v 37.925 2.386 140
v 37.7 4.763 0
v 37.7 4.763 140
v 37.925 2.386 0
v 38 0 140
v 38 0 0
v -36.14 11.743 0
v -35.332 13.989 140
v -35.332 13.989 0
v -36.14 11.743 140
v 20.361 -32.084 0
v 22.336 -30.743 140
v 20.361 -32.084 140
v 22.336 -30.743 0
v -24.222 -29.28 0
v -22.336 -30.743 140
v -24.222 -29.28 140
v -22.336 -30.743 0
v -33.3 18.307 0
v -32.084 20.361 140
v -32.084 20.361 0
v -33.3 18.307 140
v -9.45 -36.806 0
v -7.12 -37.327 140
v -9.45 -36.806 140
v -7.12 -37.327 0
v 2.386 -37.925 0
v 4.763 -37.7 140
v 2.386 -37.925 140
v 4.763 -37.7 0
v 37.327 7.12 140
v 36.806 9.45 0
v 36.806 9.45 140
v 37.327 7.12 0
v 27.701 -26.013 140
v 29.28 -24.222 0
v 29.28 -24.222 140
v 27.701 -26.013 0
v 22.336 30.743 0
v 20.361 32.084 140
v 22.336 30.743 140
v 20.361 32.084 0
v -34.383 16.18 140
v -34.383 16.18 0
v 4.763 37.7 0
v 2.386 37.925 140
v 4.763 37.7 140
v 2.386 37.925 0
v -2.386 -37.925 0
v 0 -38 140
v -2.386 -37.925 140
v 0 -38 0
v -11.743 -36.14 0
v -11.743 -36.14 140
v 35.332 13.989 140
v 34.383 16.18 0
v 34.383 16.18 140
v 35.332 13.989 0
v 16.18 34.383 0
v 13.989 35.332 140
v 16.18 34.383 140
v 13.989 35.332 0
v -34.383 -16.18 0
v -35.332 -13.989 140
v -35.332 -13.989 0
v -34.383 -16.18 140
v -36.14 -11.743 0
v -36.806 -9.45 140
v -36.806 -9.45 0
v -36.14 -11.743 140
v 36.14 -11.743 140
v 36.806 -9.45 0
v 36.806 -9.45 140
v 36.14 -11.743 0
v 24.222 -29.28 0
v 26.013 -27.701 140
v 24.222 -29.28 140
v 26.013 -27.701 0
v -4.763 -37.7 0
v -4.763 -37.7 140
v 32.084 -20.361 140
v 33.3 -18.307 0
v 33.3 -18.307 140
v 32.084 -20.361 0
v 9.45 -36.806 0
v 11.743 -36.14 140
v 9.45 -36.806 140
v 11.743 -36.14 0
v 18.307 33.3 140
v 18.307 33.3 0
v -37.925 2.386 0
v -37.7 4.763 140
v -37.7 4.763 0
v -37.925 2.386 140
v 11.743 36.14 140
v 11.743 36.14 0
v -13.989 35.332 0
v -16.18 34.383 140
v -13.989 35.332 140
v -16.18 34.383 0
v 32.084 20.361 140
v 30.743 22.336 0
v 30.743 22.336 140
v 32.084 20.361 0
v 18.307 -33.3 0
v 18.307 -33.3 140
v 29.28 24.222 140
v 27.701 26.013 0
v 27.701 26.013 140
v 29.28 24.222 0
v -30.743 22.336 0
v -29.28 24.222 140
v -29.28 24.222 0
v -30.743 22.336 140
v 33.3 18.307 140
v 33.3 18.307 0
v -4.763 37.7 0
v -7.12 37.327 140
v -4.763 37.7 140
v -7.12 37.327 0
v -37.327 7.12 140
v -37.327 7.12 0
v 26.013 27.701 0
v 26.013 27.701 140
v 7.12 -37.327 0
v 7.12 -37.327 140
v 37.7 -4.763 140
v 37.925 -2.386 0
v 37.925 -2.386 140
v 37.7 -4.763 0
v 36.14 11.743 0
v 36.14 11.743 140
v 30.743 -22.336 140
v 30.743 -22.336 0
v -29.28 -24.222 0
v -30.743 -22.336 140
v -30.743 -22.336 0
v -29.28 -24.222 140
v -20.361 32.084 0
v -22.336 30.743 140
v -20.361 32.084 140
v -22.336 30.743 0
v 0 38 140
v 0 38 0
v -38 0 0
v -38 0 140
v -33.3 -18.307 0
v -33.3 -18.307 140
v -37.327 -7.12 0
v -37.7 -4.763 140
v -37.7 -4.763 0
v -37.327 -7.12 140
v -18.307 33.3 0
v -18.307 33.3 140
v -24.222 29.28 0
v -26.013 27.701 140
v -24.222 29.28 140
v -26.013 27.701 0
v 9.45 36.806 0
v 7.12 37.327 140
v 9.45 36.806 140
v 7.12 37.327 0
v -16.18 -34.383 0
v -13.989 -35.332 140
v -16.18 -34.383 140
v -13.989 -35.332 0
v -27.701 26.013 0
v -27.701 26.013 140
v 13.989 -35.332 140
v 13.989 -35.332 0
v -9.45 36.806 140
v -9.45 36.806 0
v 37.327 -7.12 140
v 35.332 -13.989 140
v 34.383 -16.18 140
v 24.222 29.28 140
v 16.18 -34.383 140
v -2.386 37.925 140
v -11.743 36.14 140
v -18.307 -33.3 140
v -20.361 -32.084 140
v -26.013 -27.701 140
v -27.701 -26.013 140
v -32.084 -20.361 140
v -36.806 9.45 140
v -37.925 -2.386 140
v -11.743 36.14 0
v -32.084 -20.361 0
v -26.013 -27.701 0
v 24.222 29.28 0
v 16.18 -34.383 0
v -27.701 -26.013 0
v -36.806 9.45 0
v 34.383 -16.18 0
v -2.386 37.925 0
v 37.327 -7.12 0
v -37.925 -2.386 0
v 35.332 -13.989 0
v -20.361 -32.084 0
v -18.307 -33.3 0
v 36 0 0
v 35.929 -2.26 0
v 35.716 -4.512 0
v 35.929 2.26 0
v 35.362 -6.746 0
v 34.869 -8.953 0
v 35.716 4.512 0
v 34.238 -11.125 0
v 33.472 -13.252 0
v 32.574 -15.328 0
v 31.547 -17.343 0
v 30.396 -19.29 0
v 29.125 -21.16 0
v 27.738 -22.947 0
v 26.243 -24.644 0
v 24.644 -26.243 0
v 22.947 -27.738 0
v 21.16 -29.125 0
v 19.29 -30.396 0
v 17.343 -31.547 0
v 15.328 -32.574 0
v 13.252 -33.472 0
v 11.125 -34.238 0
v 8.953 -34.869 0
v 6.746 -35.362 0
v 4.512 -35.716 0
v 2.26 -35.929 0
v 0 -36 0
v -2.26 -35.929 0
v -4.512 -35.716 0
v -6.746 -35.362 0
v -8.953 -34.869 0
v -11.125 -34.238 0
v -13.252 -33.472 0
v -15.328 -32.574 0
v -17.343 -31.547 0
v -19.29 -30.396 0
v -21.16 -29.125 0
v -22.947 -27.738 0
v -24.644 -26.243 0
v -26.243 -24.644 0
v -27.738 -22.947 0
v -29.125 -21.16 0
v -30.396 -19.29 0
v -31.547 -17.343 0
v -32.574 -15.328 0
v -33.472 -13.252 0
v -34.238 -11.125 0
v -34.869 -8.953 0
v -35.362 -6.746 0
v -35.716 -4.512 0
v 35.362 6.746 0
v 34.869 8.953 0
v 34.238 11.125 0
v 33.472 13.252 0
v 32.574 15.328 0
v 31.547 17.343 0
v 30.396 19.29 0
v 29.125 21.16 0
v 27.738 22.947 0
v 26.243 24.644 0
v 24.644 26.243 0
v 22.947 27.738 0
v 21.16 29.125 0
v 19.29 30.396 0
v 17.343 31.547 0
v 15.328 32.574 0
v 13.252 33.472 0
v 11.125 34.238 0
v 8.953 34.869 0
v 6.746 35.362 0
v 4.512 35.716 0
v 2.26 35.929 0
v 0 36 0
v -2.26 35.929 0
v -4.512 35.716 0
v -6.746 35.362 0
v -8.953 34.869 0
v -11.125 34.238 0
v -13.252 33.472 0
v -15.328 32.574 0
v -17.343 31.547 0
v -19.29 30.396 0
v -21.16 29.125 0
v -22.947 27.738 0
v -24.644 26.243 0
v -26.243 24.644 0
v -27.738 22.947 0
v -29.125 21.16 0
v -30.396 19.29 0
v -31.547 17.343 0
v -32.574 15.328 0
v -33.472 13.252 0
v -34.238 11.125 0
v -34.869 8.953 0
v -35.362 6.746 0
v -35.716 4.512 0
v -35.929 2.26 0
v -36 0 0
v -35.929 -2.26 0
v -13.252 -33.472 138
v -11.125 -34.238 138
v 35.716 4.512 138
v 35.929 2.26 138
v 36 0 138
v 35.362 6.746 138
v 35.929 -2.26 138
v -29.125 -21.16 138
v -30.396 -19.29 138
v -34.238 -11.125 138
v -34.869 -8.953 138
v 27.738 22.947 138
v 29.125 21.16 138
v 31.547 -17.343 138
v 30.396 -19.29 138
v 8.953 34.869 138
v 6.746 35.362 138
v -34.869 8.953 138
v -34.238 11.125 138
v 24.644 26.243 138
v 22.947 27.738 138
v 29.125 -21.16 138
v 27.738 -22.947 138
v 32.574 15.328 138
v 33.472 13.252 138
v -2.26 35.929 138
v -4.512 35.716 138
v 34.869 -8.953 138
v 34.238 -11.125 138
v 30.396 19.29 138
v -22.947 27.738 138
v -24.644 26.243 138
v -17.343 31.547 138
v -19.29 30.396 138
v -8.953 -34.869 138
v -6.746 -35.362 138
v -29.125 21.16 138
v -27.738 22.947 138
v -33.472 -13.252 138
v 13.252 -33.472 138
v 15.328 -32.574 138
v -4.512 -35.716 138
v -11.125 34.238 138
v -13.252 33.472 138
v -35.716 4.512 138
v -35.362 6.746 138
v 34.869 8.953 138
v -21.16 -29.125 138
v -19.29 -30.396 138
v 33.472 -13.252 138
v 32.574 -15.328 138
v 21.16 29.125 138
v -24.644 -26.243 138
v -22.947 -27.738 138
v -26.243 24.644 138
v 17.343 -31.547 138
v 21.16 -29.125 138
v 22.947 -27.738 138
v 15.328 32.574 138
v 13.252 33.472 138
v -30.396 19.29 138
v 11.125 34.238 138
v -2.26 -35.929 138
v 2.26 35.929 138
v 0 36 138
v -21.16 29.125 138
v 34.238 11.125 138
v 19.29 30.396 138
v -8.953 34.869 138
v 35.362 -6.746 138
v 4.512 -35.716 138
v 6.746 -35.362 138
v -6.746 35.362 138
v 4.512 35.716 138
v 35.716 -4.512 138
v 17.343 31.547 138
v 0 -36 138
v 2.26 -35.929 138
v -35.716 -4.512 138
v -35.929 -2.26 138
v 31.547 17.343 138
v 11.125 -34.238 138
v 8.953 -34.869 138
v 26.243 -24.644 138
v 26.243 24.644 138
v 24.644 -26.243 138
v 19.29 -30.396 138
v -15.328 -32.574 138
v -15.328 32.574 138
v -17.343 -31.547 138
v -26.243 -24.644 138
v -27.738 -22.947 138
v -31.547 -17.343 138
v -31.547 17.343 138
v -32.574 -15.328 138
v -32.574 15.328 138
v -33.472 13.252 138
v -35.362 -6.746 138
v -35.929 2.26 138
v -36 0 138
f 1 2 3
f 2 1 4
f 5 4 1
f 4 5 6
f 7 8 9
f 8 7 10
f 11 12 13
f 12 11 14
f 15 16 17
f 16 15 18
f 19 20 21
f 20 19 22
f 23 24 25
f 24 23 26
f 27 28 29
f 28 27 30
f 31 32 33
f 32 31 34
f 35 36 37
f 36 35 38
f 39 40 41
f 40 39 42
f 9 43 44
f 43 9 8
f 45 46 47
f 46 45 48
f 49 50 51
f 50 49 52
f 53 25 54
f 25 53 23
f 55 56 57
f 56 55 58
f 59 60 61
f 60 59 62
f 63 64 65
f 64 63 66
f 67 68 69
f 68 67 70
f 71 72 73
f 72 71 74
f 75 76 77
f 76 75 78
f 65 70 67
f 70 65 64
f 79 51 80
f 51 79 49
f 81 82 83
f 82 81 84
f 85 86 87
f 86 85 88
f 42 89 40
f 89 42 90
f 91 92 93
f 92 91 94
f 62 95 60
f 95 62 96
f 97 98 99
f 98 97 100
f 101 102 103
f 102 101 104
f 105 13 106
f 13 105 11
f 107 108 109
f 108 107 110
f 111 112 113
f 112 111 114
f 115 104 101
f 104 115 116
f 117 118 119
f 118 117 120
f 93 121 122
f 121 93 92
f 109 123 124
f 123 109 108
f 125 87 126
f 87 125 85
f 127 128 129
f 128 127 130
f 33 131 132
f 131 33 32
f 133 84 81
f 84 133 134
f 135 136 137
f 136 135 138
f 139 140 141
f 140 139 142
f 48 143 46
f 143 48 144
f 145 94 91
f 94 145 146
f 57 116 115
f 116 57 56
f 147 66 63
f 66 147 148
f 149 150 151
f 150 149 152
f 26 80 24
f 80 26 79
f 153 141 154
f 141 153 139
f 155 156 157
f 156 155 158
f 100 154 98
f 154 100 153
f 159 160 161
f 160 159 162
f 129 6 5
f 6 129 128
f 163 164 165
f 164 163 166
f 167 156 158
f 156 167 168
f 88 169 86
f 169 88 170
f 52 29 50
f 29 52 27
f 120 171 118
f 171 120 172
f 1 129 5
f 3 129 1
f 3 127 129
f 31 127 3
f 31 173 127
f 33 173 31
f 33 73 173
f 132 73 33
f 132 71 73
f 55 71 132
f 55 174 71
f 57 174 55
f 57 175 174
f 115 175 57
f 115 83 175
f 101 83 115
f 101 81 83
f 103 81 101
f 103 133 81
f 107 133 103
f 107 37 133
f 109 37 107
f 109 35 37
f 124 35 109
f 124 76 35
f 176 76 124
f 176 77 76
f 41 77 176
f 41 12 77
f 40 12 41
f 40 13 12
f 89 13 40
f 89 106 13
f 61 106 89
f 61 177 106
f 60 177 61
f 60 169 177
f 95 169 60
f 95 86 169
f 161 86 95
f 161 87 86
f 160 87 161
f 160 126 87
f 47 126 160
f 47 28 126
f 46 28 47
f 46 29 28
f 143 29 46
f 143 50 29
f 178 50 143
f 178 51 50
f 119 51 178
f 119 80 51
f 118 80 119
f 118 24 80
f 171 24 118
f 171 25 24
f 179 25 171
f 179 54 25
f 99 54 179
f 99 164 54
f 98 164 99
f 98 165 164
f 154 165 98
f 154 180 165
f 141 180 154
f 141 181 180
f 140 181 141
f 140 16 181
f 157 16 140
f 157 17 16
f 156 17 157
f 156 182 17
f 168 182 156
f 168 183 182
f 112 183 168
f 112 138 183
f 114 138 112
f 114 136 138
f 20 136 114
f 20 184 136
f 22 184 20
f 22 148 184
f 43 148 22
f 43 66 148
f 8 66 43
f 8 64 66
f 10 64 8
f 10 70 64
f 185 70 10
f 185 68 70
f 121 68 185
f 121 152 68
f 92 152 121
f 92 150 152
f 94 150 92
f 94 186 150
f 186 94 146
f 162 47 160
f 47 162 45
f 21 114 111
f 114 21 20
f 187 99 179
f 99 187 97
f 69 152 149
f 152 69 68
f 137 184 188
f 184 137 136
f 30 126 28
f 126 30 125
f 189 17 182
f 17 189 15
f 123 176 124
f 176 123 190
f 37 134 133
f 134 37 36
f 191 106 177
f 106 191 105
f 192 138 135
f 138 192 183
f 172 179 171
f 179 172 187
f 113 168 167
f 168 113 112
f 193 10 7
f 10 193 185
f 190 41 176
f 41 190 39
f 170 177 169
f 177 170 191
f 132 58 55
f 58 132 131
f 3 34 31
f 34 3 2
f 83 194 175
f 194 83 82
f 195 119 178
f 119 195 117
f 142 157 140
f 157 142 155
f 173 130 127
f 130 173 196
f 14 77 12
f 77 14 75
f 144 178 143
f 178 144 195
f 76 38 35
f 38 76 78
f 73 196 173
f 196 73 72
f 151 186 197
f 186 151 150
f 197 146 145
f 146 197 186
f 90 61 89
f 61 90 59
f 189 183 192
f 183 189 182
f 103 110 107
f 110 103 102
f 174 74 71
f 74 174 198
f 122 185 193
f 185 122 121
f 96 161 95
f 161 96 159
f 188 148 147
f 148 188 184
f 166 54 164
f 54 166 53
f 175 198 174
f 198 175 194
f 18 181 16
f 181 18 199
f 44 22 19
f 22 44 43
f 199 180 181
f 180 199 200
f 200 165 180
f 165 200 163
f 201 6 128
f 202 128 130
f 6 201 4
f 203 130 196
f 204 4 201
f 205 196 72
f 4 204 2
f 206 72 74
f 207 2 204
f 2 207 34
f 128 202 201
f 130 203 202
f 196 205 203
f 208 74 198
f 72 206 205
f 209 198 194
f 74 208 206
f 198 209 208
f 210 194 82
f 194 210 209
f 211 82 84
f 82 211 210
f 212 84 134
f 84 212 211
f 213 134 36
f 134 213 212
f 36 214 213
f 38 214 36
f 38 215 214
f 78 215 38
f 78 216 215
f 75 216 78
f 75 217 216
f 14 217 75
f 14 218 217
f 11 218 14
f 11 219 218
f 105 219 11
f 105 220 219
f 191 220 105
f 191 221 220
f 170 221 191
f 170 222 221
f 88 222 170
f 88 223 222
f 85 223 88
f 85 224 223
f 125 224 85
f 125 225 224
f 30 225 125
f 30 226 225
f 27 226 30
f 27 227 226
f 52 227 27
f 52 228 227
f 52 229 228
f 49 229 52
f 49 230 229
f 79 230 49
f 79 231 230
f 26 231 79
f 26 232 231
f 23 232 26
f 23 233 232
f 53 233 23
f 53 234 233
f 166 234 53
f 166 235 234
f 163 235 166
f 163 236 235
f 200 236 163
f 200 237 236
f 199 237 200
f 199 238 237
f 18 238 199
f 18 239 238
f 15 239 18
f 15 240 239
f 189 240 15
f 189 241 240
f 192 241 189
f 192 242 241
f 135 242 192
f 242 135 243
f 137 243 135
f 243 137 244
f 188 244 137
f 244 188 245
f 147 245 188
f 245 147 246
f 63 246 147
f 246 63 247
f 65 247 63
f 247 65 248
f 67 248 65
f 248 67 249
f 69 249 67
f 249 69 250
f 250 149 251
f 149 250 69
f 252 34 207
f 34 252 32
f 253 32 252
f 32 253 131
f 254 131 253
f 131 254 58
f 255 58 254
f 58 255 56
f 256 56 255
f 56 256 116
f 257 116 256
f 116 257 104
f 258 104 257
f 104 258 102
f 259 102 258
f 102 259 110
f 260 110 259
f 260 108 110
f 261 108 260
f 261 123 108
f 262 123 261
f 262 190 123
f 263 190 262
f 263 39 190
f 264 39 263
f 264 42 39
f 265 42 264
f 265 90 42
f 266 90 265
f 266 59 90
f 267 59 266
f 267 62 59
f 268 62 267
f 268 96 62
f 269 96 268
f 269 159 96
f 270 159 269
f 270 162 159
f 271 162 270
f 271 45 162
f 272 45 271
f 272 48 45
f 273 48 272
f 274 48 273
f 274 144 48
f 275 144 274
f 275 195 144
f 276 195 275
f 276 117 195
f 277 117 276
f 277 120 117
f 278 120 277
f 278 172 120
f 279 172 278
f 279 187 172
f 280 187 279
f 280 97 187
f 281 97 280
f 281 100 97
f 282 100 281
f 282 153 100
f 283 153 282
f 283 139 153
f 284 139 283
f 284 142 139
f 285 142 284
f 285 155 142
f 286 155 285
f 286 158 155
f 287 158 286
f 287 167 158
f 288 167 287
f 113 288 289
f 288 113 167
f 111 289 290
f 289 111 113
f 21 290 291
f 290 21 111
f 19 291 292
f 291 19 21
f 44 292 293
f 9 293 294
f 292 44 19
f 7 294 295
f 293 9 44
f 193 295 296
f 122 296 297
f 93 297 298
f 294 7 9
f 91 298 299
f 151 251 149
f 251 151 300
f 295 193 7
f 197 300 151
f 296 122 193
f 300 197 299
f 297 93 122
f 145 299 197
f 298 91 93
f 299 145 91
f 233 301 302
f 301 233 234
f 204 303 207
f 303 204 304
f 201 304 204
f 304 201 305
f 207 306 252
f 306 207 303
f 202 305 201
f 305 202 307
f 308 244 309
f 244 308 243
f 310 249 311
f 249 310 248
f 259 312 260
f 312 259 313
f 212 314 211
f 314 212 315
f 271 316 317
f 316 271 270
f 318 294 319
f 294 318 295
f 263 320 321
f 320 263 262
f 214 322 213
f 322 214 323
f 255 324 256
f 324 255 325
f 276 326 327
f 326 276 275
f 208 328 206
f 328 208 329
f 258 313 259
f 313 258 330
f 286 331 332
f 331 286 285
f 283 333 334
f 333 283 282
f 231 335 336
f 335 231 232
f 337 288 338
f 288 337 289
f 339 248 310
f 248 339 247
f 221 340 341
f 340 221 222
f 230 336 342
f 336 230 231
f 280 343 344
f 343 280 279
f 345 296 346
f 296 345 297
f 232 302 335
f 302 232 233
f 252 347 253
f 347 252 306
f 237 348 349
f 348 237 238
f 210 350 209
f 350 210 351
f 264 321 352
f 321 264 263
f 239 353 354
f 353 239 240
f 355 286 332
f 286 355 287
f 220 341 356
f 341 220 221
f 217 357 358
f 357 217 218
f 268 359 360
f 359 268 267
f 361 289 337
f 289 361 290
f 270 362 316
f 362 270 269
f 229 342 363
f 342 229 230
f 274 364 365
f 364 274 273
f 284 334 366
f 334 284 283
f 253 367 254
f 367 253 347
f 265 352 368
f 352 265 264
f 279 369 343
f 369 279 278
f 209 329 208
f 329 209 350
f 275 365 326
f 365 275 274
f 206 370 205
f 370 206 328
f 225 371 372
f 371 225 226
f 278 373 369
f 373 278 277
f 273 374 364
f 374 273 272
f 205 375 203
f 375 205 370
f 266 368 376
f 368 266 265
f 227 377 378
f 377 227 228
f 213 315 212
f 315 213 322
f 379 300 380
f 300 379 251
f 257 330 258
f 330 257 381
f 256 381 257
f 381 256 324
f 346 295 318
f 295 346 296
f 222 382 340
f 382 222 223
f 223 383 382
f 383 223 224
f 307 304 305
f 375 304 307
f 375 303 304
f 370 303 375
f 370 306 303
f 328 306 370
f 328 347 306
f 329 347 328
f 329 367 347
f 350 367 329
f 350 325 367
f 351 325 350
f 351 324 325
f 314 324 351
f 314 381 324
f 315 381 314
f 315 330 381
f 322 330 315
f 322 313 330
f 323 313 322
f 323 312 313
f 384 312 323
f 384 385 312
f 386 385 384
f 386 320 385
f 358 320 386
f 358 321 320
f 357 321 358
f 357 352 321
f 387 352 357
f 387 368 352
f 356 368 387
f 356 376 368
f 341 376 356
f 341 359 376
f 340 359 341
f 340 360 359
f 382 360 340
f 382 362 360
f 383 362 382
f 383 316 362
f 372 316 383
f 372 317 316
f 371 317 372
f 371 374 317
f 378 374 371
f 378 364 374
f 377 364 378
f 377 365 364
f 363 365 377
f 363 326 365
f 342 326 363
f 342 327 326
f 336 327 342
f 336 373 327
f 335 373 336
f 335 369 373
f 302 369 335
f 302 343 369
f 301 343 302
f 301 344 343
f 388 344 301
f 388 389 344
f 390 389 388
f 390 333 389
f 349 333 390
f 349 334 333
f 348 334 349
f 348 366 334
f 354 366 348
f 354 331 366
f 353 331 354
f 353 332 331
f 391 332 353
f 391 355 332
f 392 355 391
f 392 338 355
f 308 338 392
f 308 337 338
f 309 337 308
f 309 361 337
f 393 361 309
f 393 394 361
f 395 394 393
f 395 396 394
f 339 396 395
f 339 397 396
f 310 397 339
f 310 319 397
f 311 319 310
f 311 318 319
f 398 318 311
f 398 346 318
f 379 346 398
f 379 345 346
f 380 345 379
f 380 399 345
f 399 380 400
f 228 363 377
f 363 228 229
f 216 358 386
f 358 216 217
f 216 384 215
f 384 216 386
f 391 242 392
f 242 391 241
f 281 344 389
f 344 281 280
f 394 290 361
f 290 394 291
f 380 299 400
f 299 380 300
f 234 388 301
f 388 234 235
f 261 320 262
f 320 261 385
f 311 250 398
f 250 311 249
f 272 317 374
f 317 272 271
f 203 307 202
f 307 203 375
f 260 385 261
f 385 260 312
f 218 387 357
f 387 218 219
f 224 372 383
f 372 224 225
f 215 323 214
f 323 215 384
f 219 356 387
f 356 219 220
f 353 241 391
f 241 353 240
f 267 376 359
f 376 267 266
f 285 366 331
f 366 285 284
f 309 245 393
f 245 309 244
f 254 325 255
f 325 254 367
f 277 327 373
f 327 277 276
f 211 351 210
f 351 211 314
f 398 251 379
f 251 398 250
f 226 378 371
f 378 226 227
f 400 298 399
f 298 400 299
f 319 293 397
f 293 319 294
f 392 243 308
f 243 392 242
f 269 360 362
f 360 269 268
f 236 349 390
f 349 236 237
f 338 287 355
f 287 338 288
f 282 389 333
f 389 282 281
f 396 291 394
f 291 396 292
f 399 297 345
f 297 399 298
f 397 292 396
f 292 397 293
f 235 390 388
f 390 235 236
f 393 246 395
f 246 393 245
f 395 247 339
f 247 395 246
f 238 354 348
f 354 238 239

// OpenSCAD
$fn = 100;
difference() {
  cylinder(140, d=76);
  cylinder(138, d=72);
}
